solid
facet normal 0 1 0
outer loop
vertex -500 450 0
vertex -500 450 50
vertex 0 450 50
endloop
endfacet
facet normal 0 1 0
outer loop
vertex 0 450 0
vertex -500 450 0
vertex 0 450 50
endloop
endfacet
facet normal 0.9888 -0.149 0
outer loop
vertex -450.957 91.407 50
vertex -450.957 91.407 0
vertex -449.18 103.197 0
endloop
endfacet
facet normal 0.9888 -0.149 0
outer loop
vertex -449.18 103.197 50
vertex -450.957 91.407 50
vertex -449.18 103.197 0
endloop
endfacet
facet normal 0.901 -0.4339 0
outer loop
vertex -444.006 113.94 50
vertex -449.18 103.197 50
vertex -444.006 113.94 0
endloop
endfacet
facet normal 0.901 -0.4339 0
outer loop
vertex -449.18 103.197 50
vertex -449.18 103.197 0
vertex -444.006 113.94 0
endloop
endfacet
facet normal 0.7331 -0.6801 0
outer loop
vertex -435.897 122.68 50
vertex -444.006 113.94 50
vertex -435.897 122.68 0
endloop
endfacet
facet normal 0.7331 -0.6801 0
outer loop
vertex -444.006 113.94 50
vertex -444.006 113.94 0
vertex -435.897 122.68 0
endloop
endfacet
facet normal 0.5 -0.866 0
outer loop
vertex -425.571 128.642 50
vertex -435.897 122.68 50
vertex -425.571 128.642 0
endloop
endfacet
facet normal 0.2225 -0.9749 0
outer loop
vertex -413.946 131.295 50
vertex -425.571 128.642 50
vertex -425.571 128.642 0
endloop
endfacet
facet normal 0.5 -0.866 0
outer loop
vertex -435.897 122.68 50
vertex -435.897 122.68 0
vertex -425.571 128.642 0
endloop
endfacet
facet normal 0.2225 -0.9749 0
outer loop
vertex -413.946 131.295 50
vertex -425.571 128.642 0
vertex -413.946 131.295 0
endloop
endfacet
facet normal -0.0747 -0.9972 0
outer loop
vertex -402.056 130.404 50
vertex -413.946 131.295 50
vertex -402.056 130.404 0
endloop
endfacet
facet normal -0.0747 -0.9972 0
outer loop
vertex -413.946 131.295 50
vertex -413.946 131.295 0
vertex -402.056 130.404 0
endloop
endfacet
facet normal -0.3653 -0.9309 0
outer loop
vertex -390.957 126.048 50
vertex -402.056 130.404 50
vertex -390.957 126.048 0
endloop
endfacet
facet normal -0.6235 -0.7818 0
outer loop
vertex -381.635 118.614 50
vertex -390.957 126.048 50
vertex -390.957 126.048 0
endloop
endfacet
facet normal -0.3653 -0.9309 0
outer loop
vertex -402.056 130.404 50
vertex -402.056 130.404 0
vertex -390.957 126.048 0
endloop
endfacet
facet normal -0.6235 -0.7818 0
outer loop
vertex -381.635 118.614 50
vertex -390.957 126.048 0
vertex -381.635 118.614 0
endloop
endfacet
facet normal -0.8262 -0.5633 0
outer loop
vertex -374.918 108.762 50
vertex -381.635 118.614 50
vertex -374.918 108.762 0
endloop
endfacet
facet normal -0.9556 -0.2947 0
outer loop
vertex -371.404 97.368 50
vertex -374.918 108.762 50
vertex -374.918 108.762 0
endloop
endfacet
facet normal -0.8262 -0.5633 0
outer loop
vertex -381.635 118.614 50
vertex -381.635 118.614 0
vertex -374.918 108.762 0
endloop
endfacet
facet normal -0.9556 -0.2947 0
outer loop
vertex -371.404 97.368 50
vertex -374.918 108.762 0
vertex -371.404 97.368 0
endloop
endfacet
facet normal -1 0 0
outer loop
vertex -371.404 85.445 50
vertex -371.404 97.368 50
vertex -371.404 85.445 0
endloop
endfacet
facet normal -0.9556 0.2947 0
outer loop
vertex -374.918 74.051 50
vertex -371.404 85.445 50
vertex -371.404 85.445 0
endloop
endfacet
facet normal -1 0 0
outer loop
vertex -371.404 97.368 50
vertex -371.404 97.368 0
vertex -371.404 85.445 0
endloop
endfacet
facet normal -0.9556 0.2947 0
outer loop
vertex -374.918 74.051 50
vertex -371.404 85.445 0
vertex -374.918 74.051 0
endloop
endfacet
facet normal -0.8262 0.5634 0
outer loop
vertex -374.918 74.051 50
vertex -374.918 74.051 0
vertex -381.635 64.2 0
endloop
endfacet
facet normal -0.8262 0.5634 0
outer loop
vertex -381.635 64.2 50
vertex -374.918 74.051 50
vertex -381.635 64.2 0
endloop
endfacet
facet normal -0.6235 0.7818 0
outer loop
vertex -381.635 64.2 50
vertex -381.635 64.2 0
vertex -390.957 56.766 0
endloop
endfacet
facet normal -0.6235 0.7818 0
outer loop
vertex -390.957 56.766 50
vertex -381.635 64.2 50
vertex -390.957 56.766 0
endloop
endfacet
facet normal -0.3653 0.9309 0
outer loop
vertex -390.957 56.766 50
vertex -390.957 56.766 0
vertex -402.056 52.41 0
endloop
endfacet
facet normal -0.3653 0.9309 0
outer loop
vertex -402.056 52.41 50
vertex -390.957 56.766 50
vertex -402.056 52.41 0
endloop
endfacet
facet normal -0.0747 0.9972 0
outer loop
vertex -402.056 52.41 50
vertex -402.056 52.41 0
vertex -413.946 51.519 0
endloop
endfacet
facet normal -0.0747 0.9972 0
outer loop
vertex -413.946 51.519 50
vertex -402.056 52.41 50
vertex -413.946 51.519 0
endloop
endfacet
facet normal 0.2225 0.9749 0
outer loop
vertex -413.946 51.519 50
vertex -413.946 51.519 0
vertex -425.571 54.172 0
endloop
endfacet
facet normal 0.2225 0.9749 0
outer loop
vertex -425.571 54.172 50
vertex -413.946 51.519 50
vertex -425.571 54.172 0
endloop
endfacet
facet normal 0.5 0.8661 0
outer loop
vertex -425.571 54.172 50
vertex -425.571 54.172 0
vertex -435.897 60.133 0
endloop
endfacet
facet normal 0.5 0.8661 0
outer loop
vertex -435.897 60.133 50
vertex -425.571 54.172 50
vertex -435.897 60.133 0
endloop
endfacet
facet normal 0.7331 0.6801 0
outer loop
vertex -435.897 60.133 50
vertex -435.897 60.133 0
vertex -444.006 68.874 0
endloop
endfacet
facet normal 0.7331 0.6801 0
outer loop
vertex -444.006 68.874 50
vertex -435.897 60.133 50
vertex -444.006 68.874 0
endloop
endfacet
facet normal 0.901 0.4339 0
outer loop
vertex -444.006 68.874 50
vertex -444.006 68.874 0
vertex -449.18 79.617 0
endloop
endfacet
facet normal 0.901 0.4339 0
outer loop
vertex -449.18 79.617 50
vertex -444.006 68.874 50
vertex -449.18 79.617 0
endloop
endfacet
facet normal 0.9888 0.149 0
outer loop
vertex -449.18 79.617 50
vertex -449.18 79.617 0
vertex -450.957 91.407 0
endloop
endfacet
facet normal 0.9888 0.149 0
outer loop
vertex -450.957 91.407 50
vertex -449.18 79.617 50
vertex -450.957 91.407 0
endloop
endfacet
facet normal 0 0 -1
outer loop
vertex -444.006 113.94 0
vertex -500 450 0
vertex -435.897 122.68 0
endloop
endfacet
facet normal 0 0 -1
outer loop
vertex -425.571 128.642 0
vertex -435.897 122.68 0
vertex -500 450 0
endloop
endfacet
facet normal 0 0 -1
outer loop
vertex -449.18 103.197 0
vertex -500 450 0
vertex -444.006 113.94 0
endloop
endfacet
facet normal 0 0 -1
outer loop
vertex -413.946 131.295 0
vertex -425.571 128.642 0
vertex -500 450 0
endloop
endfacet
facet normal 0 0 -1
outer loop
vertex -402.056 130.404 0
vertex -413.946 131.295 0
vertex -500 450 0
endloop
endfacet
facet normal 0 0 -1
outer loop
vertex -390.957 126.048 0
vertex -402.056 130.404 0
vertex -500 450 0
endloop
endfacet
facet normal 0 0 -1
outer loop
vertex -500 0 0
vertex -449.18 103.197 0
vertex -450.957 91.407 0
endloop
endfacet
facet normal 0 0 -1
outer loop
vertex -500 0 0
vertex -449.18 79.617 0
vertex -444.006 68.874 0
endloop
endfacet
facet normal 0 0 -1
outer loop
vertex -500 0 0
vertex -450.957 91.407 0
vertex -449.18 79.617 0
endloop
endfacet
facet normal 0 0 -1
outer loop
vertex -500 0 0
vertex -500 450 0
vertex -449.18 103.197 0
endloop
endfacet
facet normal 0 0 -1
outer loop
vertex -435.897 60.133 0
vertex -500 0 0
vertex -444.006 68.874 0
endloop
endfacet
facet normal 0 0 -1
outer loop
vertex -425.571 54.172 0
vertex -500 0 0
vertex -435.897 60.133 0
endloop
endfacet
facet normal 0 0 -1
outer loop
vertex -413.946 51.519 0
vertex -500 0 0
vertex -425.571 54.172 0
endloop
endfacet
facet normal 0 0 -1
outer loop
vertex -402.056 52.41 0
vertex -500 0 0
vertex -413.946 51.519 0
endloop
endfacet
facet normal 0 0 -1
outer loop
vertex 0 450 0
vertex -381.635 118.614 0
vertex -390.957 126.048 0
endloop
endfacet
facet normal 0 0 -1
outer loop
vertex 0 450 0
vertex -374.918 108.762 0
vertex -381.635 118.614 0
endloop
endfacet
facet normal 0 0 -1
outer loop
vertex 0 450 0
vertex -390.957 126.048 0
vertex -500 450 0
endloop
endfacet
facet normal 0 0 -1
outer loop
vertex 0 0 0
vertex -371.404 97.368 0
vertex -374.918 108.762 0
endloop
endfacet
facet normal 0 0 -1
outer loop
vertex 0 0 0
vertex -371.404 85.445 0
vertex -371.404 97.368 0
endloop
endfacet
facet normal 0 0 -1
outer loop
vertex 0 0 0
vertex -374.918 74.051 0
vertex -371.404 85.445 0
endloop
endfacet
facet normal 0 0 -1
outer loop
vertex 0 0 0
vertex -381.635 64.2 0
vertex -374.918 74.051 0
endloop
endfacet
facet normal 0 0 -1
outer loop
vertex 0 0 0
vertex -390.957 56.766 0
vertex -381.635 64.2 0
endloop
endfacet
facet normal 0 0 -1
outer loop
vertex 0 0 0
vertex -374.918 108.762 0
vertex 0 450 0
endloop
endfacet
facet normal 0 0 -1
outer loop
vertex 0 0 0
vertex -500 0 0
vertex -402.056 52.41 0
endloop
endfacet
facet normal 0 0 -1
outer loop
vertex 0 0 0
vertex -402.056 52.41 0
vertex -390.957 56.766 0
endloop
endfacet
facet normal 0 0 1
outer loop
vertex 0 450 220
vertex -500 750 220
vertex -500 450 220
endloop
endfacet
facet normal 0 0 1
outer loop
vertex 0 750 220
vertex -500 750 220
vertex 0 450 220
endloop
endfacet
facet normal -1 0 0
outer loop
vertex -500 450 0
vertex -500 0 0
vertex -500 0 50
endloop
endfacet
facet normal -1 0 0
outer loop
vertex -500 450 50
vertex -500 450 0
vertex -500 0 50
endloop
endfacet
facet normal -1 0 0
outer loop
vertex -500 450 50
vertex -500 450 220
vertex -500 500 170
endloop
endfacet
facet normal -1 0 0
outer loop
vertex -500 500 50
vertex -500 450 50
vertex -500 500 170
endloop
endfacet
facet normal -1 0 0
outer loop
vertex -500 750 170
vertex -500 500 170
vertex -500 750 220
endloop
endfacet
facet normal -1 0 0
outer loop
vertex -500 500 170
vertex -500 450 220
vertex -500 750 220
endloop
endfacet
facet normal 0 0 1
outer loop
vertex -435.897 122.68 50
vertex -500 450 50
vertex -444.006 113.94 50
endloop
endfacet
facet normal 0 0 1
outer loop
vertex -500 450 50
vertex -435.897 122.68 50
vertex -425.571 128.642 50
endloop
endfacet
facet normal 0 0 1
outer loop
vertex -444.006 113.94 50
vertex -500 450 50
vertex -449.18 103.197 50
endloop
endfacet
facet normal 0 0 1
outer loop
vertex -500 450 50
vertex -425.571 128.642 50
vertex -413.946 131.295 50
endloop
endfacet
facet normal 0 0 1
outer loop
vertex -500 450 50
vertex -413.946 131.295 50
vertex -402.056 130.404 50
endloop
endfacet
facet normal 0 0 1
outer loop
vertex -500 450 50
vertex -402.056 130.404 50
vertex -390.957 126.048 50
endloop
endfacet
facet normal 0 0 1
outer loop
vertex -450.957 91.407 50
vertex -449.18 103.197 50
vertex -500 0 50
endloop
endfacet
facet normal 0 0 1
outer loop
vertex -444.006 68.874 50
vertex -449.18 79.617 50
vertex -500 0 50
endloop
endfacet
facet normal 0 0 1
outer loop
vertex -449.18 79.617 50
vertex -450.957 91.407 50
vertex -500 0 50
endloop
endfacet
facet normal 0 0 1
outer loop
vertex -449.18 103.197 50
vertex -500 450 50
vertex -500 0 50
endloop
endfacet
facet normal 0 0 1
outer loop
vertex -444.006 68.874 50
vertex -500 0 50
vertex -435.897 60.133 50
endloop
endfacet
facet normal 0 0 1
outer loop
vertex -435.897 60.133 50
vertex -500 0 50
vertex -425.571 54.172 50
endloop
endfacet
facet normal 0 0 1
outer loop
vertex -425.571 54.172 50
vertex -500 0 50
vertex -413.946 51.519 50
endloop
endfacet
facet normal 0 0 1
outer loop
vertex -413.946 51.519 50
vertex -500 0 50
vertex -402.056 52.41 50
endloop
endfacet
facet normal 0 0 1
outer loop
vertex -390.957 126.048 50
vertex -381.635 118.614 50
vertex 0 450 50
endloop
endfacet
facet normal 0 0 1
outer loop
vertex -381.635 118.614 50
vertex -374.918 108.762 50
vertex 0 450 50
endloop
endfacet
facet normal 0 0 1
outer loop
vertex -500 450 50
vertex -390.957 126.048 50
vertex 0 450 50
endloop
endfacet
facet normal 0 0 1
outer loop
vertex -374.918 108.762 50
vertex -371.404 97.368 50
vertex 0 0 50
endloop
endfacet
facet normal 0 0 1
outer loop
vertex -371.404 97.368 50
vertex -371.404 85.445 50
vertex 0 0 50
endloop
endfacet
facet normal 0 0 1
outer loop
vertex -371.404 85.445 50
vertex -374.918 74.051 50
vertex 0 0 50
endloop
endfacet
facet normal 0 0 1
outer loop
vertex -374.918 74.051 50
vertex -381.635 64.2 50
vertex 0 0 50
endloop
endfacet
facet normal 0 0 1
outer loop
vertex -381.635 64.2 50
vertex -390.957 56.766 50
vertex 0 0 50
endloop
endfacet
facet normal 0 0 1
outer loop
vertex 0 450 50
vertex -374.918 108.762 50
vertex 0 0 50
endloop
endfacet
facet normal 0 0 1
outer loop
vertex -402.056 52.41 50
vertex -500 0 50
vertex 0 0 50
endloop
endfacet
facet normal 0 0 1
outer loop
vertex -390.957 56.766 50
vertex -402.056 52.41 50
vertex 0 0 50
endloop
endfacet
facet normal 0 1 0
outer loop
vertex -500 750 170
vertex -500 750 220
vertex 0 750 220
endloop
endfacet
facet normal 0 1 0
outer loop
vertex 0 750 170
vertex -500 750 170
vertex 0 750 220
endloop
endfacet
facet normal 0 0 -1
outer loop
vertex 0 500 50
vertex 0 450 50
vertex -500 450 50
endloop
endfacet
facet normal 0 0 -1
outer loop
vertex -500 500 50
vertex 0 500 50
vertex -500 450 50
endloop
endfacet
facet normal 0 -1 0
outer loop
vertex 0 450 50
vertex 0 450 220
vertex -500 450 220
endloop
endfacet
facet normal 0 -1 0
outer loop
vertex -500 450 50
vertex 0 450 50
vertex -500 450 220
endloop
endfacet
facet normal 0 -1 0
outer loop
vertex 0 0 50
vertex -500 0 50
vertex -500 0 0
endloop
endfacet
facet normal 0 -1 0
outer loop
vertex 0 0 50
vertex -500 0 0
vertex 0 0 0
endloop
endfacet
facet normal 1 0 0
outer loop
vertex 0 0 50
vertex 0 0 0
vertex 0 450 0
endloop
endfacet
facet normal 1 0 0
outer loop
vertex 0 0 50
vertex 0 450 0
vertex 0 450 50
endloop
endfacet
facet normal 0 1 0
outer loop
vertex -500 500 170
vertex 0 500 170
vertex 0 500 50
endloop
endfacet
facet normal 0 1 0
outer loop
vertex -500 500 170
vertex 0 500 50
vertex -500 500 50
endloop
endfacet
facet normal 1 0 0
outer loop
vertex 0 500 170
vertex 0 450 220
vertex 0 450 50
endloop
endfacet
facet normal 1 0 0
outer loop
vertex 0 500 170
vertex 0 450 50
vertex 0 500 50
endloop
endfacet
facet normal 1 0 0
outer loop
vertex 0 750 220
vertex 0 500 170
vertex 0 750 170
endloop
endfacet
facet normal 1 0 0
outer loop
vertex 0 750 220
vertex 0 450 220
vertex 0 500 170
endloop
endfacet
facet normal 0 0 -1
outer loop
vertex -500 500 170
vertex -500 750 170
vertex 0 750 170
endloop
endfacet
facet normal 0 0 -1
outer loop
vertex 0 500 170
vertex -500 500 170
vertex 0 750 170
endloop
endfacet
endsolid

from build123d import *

# Parameters (mm, degrees)
F0_W     = 500
F0_H     = 50.000004
F1_DEPTH = 450
F2_W     = 500
F2_H     = 170
F3_DEPTH = 50
F4_W     = 500
F4_H     = 250
F5_DEPTH = 50
F7_D     = 80


with BuildPart() as f1:
    # F0 (on Front) → F1 (new body)
    with BuildSketch(Plane.XZ):
        with Locations((-250, 25.000002)):
            Rectangle(F0_W, F0_H)
    extrude(amount=-F1_DEPTH)

    # F7 (through all)
    with Locations(Plane.XY.offset(50.000004)):
        with Locations((-410.956919, 91.40674)):
            Hole(F7_D / 2)


with BuildPart() as f3:
    # F2 (on face) → F3 (new body)
    with BuildSketch(Plane(origin=(0, 450, 0), x_dir=(-1, 0, 0), z_dir=(0, 1, 0))):
        with Locations((250, 135.000004)):
            Rectangle(F2_W, F2_H)
    extrude(amount=F3_DEPTH)

    # F4 (on face) → F5 (join)
    with BuildSketch(Plane.XY.offset(220.000004)):
        with Locations((-250, 625)):
            Rectangle(F4_W, F4_H)
    extrude(amount=-F5_DEPTH)


solid = Compound([f1.part, f3.part])
